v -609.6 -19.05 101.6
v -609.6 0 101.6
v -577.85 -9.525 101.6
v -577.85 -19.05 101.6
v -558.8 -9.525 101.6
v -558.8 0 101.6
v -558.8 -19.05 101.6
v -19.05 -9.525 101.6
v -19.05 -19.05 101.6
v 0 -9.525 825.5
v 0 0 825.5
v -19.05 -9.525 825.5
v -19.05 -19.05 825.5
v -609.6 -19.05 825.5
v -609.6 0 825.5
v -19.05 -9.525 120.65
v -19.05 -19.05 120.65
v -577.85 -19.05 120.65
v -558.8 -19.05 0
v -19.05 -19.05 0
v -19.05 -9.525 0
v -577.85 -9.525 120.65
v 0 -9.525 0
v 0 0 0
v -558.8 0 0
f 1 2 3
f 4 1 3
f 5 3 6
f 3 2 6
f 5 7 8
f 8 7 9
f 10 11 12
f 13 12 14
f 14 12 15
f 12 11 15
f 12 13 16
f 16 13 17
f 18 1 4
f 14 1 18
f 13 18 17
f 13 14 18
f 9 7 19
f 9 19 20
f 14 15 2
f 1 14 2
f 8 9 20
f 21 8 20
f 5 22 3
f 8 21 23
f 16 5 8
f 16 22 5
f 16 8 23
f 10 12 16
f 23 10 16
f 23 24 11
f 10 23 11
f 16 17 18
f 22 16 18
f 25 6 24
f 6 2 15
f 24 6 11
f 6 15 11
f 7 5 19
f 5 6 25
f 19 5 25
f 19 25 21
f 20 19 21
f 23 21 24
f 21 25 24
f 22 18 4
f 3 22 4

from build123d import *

# Parameters (mm, degrees)
F1_DEPTH = 19.05
F3_DEPTH = 9.525


with BuildPart() as f1:
    # F0 (on Front) → F1 (new body)
    with BuildSketch(Plane.XZ):
        Polygon((-558.8, 0), (0, 0), (0, 825.5), (-609.6, 825.5), (-609.6, 101.6), (-558.8, 101.6), align=None)
    extrude(amount=F1_DEPTH)

    # F2 (on face) → F3 (cut)
    with BuildSketch(Plane.XZ.offset(19.05)):
        Polygon((0, 825.5), (-19.05, 825.5), (-19.05, 120.65), (-577.85, 120.65), (-577.85, 101.6), (-558.8, 101.6), (-19.05, 101.6), (-19.05, 0), (0, 0), align=None)
    extrude(amount=-F3_DEPTH, mode=Mode.SUBTRACT)


solid = f1.part
